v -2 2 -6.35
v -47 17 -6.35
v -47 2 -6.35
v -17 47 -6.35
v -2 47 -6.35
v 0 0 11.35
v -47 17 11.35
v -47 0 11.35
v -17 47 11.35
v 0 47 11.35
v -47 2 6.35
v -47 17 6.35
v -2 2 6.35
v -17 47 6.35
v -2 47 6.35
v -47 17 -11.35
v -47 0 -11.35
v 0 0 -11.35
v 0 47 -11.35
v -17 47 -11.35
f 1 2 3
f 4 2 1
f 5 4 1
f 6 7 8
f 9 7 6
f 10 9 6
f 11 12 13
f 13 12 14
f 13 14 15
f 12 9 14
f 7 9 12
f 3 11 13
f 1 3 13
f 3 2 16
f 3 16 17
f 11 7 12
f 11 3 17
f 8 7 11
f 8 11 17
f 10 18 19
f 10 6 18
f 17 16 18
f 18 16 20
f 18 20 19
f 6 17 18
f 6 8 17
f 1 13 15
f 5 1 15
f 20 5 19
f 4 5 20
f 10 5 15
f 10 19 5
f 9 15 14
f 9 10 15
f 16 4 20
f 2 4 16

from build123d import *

# Parameters (mm, degrees)
BOSS_EXTRUDE1_DEPTH = 11.35
CUT_EXTRUDE1_DEPTH  = 6.35


with BuildPart() as part:
    # Sketch1 → Boss-Extrude1 (new body, symmetric)
    with BuildSketch(Plane.XY):
        Polygon((0, 0), (0, 47), (-17, 47), (-47, 17), (-47, 0), align=None)
    extrude(amount=BOSS_EXTRUDE1_DEPTH, both=True)

    # Sketch2 → Cut-Extrude1 (cut, symmetric)
    with BuildSketch(Plane.XY):
        Polygon((-47, 17), (-47, 2), (-2, 2), (-2, 47), (-17, 47), align=None)
    extrude(amount=CUT_EXTRUDE1_DEPTH, both=True, mode=Mode.SUBTRACT)


solid = part.part
